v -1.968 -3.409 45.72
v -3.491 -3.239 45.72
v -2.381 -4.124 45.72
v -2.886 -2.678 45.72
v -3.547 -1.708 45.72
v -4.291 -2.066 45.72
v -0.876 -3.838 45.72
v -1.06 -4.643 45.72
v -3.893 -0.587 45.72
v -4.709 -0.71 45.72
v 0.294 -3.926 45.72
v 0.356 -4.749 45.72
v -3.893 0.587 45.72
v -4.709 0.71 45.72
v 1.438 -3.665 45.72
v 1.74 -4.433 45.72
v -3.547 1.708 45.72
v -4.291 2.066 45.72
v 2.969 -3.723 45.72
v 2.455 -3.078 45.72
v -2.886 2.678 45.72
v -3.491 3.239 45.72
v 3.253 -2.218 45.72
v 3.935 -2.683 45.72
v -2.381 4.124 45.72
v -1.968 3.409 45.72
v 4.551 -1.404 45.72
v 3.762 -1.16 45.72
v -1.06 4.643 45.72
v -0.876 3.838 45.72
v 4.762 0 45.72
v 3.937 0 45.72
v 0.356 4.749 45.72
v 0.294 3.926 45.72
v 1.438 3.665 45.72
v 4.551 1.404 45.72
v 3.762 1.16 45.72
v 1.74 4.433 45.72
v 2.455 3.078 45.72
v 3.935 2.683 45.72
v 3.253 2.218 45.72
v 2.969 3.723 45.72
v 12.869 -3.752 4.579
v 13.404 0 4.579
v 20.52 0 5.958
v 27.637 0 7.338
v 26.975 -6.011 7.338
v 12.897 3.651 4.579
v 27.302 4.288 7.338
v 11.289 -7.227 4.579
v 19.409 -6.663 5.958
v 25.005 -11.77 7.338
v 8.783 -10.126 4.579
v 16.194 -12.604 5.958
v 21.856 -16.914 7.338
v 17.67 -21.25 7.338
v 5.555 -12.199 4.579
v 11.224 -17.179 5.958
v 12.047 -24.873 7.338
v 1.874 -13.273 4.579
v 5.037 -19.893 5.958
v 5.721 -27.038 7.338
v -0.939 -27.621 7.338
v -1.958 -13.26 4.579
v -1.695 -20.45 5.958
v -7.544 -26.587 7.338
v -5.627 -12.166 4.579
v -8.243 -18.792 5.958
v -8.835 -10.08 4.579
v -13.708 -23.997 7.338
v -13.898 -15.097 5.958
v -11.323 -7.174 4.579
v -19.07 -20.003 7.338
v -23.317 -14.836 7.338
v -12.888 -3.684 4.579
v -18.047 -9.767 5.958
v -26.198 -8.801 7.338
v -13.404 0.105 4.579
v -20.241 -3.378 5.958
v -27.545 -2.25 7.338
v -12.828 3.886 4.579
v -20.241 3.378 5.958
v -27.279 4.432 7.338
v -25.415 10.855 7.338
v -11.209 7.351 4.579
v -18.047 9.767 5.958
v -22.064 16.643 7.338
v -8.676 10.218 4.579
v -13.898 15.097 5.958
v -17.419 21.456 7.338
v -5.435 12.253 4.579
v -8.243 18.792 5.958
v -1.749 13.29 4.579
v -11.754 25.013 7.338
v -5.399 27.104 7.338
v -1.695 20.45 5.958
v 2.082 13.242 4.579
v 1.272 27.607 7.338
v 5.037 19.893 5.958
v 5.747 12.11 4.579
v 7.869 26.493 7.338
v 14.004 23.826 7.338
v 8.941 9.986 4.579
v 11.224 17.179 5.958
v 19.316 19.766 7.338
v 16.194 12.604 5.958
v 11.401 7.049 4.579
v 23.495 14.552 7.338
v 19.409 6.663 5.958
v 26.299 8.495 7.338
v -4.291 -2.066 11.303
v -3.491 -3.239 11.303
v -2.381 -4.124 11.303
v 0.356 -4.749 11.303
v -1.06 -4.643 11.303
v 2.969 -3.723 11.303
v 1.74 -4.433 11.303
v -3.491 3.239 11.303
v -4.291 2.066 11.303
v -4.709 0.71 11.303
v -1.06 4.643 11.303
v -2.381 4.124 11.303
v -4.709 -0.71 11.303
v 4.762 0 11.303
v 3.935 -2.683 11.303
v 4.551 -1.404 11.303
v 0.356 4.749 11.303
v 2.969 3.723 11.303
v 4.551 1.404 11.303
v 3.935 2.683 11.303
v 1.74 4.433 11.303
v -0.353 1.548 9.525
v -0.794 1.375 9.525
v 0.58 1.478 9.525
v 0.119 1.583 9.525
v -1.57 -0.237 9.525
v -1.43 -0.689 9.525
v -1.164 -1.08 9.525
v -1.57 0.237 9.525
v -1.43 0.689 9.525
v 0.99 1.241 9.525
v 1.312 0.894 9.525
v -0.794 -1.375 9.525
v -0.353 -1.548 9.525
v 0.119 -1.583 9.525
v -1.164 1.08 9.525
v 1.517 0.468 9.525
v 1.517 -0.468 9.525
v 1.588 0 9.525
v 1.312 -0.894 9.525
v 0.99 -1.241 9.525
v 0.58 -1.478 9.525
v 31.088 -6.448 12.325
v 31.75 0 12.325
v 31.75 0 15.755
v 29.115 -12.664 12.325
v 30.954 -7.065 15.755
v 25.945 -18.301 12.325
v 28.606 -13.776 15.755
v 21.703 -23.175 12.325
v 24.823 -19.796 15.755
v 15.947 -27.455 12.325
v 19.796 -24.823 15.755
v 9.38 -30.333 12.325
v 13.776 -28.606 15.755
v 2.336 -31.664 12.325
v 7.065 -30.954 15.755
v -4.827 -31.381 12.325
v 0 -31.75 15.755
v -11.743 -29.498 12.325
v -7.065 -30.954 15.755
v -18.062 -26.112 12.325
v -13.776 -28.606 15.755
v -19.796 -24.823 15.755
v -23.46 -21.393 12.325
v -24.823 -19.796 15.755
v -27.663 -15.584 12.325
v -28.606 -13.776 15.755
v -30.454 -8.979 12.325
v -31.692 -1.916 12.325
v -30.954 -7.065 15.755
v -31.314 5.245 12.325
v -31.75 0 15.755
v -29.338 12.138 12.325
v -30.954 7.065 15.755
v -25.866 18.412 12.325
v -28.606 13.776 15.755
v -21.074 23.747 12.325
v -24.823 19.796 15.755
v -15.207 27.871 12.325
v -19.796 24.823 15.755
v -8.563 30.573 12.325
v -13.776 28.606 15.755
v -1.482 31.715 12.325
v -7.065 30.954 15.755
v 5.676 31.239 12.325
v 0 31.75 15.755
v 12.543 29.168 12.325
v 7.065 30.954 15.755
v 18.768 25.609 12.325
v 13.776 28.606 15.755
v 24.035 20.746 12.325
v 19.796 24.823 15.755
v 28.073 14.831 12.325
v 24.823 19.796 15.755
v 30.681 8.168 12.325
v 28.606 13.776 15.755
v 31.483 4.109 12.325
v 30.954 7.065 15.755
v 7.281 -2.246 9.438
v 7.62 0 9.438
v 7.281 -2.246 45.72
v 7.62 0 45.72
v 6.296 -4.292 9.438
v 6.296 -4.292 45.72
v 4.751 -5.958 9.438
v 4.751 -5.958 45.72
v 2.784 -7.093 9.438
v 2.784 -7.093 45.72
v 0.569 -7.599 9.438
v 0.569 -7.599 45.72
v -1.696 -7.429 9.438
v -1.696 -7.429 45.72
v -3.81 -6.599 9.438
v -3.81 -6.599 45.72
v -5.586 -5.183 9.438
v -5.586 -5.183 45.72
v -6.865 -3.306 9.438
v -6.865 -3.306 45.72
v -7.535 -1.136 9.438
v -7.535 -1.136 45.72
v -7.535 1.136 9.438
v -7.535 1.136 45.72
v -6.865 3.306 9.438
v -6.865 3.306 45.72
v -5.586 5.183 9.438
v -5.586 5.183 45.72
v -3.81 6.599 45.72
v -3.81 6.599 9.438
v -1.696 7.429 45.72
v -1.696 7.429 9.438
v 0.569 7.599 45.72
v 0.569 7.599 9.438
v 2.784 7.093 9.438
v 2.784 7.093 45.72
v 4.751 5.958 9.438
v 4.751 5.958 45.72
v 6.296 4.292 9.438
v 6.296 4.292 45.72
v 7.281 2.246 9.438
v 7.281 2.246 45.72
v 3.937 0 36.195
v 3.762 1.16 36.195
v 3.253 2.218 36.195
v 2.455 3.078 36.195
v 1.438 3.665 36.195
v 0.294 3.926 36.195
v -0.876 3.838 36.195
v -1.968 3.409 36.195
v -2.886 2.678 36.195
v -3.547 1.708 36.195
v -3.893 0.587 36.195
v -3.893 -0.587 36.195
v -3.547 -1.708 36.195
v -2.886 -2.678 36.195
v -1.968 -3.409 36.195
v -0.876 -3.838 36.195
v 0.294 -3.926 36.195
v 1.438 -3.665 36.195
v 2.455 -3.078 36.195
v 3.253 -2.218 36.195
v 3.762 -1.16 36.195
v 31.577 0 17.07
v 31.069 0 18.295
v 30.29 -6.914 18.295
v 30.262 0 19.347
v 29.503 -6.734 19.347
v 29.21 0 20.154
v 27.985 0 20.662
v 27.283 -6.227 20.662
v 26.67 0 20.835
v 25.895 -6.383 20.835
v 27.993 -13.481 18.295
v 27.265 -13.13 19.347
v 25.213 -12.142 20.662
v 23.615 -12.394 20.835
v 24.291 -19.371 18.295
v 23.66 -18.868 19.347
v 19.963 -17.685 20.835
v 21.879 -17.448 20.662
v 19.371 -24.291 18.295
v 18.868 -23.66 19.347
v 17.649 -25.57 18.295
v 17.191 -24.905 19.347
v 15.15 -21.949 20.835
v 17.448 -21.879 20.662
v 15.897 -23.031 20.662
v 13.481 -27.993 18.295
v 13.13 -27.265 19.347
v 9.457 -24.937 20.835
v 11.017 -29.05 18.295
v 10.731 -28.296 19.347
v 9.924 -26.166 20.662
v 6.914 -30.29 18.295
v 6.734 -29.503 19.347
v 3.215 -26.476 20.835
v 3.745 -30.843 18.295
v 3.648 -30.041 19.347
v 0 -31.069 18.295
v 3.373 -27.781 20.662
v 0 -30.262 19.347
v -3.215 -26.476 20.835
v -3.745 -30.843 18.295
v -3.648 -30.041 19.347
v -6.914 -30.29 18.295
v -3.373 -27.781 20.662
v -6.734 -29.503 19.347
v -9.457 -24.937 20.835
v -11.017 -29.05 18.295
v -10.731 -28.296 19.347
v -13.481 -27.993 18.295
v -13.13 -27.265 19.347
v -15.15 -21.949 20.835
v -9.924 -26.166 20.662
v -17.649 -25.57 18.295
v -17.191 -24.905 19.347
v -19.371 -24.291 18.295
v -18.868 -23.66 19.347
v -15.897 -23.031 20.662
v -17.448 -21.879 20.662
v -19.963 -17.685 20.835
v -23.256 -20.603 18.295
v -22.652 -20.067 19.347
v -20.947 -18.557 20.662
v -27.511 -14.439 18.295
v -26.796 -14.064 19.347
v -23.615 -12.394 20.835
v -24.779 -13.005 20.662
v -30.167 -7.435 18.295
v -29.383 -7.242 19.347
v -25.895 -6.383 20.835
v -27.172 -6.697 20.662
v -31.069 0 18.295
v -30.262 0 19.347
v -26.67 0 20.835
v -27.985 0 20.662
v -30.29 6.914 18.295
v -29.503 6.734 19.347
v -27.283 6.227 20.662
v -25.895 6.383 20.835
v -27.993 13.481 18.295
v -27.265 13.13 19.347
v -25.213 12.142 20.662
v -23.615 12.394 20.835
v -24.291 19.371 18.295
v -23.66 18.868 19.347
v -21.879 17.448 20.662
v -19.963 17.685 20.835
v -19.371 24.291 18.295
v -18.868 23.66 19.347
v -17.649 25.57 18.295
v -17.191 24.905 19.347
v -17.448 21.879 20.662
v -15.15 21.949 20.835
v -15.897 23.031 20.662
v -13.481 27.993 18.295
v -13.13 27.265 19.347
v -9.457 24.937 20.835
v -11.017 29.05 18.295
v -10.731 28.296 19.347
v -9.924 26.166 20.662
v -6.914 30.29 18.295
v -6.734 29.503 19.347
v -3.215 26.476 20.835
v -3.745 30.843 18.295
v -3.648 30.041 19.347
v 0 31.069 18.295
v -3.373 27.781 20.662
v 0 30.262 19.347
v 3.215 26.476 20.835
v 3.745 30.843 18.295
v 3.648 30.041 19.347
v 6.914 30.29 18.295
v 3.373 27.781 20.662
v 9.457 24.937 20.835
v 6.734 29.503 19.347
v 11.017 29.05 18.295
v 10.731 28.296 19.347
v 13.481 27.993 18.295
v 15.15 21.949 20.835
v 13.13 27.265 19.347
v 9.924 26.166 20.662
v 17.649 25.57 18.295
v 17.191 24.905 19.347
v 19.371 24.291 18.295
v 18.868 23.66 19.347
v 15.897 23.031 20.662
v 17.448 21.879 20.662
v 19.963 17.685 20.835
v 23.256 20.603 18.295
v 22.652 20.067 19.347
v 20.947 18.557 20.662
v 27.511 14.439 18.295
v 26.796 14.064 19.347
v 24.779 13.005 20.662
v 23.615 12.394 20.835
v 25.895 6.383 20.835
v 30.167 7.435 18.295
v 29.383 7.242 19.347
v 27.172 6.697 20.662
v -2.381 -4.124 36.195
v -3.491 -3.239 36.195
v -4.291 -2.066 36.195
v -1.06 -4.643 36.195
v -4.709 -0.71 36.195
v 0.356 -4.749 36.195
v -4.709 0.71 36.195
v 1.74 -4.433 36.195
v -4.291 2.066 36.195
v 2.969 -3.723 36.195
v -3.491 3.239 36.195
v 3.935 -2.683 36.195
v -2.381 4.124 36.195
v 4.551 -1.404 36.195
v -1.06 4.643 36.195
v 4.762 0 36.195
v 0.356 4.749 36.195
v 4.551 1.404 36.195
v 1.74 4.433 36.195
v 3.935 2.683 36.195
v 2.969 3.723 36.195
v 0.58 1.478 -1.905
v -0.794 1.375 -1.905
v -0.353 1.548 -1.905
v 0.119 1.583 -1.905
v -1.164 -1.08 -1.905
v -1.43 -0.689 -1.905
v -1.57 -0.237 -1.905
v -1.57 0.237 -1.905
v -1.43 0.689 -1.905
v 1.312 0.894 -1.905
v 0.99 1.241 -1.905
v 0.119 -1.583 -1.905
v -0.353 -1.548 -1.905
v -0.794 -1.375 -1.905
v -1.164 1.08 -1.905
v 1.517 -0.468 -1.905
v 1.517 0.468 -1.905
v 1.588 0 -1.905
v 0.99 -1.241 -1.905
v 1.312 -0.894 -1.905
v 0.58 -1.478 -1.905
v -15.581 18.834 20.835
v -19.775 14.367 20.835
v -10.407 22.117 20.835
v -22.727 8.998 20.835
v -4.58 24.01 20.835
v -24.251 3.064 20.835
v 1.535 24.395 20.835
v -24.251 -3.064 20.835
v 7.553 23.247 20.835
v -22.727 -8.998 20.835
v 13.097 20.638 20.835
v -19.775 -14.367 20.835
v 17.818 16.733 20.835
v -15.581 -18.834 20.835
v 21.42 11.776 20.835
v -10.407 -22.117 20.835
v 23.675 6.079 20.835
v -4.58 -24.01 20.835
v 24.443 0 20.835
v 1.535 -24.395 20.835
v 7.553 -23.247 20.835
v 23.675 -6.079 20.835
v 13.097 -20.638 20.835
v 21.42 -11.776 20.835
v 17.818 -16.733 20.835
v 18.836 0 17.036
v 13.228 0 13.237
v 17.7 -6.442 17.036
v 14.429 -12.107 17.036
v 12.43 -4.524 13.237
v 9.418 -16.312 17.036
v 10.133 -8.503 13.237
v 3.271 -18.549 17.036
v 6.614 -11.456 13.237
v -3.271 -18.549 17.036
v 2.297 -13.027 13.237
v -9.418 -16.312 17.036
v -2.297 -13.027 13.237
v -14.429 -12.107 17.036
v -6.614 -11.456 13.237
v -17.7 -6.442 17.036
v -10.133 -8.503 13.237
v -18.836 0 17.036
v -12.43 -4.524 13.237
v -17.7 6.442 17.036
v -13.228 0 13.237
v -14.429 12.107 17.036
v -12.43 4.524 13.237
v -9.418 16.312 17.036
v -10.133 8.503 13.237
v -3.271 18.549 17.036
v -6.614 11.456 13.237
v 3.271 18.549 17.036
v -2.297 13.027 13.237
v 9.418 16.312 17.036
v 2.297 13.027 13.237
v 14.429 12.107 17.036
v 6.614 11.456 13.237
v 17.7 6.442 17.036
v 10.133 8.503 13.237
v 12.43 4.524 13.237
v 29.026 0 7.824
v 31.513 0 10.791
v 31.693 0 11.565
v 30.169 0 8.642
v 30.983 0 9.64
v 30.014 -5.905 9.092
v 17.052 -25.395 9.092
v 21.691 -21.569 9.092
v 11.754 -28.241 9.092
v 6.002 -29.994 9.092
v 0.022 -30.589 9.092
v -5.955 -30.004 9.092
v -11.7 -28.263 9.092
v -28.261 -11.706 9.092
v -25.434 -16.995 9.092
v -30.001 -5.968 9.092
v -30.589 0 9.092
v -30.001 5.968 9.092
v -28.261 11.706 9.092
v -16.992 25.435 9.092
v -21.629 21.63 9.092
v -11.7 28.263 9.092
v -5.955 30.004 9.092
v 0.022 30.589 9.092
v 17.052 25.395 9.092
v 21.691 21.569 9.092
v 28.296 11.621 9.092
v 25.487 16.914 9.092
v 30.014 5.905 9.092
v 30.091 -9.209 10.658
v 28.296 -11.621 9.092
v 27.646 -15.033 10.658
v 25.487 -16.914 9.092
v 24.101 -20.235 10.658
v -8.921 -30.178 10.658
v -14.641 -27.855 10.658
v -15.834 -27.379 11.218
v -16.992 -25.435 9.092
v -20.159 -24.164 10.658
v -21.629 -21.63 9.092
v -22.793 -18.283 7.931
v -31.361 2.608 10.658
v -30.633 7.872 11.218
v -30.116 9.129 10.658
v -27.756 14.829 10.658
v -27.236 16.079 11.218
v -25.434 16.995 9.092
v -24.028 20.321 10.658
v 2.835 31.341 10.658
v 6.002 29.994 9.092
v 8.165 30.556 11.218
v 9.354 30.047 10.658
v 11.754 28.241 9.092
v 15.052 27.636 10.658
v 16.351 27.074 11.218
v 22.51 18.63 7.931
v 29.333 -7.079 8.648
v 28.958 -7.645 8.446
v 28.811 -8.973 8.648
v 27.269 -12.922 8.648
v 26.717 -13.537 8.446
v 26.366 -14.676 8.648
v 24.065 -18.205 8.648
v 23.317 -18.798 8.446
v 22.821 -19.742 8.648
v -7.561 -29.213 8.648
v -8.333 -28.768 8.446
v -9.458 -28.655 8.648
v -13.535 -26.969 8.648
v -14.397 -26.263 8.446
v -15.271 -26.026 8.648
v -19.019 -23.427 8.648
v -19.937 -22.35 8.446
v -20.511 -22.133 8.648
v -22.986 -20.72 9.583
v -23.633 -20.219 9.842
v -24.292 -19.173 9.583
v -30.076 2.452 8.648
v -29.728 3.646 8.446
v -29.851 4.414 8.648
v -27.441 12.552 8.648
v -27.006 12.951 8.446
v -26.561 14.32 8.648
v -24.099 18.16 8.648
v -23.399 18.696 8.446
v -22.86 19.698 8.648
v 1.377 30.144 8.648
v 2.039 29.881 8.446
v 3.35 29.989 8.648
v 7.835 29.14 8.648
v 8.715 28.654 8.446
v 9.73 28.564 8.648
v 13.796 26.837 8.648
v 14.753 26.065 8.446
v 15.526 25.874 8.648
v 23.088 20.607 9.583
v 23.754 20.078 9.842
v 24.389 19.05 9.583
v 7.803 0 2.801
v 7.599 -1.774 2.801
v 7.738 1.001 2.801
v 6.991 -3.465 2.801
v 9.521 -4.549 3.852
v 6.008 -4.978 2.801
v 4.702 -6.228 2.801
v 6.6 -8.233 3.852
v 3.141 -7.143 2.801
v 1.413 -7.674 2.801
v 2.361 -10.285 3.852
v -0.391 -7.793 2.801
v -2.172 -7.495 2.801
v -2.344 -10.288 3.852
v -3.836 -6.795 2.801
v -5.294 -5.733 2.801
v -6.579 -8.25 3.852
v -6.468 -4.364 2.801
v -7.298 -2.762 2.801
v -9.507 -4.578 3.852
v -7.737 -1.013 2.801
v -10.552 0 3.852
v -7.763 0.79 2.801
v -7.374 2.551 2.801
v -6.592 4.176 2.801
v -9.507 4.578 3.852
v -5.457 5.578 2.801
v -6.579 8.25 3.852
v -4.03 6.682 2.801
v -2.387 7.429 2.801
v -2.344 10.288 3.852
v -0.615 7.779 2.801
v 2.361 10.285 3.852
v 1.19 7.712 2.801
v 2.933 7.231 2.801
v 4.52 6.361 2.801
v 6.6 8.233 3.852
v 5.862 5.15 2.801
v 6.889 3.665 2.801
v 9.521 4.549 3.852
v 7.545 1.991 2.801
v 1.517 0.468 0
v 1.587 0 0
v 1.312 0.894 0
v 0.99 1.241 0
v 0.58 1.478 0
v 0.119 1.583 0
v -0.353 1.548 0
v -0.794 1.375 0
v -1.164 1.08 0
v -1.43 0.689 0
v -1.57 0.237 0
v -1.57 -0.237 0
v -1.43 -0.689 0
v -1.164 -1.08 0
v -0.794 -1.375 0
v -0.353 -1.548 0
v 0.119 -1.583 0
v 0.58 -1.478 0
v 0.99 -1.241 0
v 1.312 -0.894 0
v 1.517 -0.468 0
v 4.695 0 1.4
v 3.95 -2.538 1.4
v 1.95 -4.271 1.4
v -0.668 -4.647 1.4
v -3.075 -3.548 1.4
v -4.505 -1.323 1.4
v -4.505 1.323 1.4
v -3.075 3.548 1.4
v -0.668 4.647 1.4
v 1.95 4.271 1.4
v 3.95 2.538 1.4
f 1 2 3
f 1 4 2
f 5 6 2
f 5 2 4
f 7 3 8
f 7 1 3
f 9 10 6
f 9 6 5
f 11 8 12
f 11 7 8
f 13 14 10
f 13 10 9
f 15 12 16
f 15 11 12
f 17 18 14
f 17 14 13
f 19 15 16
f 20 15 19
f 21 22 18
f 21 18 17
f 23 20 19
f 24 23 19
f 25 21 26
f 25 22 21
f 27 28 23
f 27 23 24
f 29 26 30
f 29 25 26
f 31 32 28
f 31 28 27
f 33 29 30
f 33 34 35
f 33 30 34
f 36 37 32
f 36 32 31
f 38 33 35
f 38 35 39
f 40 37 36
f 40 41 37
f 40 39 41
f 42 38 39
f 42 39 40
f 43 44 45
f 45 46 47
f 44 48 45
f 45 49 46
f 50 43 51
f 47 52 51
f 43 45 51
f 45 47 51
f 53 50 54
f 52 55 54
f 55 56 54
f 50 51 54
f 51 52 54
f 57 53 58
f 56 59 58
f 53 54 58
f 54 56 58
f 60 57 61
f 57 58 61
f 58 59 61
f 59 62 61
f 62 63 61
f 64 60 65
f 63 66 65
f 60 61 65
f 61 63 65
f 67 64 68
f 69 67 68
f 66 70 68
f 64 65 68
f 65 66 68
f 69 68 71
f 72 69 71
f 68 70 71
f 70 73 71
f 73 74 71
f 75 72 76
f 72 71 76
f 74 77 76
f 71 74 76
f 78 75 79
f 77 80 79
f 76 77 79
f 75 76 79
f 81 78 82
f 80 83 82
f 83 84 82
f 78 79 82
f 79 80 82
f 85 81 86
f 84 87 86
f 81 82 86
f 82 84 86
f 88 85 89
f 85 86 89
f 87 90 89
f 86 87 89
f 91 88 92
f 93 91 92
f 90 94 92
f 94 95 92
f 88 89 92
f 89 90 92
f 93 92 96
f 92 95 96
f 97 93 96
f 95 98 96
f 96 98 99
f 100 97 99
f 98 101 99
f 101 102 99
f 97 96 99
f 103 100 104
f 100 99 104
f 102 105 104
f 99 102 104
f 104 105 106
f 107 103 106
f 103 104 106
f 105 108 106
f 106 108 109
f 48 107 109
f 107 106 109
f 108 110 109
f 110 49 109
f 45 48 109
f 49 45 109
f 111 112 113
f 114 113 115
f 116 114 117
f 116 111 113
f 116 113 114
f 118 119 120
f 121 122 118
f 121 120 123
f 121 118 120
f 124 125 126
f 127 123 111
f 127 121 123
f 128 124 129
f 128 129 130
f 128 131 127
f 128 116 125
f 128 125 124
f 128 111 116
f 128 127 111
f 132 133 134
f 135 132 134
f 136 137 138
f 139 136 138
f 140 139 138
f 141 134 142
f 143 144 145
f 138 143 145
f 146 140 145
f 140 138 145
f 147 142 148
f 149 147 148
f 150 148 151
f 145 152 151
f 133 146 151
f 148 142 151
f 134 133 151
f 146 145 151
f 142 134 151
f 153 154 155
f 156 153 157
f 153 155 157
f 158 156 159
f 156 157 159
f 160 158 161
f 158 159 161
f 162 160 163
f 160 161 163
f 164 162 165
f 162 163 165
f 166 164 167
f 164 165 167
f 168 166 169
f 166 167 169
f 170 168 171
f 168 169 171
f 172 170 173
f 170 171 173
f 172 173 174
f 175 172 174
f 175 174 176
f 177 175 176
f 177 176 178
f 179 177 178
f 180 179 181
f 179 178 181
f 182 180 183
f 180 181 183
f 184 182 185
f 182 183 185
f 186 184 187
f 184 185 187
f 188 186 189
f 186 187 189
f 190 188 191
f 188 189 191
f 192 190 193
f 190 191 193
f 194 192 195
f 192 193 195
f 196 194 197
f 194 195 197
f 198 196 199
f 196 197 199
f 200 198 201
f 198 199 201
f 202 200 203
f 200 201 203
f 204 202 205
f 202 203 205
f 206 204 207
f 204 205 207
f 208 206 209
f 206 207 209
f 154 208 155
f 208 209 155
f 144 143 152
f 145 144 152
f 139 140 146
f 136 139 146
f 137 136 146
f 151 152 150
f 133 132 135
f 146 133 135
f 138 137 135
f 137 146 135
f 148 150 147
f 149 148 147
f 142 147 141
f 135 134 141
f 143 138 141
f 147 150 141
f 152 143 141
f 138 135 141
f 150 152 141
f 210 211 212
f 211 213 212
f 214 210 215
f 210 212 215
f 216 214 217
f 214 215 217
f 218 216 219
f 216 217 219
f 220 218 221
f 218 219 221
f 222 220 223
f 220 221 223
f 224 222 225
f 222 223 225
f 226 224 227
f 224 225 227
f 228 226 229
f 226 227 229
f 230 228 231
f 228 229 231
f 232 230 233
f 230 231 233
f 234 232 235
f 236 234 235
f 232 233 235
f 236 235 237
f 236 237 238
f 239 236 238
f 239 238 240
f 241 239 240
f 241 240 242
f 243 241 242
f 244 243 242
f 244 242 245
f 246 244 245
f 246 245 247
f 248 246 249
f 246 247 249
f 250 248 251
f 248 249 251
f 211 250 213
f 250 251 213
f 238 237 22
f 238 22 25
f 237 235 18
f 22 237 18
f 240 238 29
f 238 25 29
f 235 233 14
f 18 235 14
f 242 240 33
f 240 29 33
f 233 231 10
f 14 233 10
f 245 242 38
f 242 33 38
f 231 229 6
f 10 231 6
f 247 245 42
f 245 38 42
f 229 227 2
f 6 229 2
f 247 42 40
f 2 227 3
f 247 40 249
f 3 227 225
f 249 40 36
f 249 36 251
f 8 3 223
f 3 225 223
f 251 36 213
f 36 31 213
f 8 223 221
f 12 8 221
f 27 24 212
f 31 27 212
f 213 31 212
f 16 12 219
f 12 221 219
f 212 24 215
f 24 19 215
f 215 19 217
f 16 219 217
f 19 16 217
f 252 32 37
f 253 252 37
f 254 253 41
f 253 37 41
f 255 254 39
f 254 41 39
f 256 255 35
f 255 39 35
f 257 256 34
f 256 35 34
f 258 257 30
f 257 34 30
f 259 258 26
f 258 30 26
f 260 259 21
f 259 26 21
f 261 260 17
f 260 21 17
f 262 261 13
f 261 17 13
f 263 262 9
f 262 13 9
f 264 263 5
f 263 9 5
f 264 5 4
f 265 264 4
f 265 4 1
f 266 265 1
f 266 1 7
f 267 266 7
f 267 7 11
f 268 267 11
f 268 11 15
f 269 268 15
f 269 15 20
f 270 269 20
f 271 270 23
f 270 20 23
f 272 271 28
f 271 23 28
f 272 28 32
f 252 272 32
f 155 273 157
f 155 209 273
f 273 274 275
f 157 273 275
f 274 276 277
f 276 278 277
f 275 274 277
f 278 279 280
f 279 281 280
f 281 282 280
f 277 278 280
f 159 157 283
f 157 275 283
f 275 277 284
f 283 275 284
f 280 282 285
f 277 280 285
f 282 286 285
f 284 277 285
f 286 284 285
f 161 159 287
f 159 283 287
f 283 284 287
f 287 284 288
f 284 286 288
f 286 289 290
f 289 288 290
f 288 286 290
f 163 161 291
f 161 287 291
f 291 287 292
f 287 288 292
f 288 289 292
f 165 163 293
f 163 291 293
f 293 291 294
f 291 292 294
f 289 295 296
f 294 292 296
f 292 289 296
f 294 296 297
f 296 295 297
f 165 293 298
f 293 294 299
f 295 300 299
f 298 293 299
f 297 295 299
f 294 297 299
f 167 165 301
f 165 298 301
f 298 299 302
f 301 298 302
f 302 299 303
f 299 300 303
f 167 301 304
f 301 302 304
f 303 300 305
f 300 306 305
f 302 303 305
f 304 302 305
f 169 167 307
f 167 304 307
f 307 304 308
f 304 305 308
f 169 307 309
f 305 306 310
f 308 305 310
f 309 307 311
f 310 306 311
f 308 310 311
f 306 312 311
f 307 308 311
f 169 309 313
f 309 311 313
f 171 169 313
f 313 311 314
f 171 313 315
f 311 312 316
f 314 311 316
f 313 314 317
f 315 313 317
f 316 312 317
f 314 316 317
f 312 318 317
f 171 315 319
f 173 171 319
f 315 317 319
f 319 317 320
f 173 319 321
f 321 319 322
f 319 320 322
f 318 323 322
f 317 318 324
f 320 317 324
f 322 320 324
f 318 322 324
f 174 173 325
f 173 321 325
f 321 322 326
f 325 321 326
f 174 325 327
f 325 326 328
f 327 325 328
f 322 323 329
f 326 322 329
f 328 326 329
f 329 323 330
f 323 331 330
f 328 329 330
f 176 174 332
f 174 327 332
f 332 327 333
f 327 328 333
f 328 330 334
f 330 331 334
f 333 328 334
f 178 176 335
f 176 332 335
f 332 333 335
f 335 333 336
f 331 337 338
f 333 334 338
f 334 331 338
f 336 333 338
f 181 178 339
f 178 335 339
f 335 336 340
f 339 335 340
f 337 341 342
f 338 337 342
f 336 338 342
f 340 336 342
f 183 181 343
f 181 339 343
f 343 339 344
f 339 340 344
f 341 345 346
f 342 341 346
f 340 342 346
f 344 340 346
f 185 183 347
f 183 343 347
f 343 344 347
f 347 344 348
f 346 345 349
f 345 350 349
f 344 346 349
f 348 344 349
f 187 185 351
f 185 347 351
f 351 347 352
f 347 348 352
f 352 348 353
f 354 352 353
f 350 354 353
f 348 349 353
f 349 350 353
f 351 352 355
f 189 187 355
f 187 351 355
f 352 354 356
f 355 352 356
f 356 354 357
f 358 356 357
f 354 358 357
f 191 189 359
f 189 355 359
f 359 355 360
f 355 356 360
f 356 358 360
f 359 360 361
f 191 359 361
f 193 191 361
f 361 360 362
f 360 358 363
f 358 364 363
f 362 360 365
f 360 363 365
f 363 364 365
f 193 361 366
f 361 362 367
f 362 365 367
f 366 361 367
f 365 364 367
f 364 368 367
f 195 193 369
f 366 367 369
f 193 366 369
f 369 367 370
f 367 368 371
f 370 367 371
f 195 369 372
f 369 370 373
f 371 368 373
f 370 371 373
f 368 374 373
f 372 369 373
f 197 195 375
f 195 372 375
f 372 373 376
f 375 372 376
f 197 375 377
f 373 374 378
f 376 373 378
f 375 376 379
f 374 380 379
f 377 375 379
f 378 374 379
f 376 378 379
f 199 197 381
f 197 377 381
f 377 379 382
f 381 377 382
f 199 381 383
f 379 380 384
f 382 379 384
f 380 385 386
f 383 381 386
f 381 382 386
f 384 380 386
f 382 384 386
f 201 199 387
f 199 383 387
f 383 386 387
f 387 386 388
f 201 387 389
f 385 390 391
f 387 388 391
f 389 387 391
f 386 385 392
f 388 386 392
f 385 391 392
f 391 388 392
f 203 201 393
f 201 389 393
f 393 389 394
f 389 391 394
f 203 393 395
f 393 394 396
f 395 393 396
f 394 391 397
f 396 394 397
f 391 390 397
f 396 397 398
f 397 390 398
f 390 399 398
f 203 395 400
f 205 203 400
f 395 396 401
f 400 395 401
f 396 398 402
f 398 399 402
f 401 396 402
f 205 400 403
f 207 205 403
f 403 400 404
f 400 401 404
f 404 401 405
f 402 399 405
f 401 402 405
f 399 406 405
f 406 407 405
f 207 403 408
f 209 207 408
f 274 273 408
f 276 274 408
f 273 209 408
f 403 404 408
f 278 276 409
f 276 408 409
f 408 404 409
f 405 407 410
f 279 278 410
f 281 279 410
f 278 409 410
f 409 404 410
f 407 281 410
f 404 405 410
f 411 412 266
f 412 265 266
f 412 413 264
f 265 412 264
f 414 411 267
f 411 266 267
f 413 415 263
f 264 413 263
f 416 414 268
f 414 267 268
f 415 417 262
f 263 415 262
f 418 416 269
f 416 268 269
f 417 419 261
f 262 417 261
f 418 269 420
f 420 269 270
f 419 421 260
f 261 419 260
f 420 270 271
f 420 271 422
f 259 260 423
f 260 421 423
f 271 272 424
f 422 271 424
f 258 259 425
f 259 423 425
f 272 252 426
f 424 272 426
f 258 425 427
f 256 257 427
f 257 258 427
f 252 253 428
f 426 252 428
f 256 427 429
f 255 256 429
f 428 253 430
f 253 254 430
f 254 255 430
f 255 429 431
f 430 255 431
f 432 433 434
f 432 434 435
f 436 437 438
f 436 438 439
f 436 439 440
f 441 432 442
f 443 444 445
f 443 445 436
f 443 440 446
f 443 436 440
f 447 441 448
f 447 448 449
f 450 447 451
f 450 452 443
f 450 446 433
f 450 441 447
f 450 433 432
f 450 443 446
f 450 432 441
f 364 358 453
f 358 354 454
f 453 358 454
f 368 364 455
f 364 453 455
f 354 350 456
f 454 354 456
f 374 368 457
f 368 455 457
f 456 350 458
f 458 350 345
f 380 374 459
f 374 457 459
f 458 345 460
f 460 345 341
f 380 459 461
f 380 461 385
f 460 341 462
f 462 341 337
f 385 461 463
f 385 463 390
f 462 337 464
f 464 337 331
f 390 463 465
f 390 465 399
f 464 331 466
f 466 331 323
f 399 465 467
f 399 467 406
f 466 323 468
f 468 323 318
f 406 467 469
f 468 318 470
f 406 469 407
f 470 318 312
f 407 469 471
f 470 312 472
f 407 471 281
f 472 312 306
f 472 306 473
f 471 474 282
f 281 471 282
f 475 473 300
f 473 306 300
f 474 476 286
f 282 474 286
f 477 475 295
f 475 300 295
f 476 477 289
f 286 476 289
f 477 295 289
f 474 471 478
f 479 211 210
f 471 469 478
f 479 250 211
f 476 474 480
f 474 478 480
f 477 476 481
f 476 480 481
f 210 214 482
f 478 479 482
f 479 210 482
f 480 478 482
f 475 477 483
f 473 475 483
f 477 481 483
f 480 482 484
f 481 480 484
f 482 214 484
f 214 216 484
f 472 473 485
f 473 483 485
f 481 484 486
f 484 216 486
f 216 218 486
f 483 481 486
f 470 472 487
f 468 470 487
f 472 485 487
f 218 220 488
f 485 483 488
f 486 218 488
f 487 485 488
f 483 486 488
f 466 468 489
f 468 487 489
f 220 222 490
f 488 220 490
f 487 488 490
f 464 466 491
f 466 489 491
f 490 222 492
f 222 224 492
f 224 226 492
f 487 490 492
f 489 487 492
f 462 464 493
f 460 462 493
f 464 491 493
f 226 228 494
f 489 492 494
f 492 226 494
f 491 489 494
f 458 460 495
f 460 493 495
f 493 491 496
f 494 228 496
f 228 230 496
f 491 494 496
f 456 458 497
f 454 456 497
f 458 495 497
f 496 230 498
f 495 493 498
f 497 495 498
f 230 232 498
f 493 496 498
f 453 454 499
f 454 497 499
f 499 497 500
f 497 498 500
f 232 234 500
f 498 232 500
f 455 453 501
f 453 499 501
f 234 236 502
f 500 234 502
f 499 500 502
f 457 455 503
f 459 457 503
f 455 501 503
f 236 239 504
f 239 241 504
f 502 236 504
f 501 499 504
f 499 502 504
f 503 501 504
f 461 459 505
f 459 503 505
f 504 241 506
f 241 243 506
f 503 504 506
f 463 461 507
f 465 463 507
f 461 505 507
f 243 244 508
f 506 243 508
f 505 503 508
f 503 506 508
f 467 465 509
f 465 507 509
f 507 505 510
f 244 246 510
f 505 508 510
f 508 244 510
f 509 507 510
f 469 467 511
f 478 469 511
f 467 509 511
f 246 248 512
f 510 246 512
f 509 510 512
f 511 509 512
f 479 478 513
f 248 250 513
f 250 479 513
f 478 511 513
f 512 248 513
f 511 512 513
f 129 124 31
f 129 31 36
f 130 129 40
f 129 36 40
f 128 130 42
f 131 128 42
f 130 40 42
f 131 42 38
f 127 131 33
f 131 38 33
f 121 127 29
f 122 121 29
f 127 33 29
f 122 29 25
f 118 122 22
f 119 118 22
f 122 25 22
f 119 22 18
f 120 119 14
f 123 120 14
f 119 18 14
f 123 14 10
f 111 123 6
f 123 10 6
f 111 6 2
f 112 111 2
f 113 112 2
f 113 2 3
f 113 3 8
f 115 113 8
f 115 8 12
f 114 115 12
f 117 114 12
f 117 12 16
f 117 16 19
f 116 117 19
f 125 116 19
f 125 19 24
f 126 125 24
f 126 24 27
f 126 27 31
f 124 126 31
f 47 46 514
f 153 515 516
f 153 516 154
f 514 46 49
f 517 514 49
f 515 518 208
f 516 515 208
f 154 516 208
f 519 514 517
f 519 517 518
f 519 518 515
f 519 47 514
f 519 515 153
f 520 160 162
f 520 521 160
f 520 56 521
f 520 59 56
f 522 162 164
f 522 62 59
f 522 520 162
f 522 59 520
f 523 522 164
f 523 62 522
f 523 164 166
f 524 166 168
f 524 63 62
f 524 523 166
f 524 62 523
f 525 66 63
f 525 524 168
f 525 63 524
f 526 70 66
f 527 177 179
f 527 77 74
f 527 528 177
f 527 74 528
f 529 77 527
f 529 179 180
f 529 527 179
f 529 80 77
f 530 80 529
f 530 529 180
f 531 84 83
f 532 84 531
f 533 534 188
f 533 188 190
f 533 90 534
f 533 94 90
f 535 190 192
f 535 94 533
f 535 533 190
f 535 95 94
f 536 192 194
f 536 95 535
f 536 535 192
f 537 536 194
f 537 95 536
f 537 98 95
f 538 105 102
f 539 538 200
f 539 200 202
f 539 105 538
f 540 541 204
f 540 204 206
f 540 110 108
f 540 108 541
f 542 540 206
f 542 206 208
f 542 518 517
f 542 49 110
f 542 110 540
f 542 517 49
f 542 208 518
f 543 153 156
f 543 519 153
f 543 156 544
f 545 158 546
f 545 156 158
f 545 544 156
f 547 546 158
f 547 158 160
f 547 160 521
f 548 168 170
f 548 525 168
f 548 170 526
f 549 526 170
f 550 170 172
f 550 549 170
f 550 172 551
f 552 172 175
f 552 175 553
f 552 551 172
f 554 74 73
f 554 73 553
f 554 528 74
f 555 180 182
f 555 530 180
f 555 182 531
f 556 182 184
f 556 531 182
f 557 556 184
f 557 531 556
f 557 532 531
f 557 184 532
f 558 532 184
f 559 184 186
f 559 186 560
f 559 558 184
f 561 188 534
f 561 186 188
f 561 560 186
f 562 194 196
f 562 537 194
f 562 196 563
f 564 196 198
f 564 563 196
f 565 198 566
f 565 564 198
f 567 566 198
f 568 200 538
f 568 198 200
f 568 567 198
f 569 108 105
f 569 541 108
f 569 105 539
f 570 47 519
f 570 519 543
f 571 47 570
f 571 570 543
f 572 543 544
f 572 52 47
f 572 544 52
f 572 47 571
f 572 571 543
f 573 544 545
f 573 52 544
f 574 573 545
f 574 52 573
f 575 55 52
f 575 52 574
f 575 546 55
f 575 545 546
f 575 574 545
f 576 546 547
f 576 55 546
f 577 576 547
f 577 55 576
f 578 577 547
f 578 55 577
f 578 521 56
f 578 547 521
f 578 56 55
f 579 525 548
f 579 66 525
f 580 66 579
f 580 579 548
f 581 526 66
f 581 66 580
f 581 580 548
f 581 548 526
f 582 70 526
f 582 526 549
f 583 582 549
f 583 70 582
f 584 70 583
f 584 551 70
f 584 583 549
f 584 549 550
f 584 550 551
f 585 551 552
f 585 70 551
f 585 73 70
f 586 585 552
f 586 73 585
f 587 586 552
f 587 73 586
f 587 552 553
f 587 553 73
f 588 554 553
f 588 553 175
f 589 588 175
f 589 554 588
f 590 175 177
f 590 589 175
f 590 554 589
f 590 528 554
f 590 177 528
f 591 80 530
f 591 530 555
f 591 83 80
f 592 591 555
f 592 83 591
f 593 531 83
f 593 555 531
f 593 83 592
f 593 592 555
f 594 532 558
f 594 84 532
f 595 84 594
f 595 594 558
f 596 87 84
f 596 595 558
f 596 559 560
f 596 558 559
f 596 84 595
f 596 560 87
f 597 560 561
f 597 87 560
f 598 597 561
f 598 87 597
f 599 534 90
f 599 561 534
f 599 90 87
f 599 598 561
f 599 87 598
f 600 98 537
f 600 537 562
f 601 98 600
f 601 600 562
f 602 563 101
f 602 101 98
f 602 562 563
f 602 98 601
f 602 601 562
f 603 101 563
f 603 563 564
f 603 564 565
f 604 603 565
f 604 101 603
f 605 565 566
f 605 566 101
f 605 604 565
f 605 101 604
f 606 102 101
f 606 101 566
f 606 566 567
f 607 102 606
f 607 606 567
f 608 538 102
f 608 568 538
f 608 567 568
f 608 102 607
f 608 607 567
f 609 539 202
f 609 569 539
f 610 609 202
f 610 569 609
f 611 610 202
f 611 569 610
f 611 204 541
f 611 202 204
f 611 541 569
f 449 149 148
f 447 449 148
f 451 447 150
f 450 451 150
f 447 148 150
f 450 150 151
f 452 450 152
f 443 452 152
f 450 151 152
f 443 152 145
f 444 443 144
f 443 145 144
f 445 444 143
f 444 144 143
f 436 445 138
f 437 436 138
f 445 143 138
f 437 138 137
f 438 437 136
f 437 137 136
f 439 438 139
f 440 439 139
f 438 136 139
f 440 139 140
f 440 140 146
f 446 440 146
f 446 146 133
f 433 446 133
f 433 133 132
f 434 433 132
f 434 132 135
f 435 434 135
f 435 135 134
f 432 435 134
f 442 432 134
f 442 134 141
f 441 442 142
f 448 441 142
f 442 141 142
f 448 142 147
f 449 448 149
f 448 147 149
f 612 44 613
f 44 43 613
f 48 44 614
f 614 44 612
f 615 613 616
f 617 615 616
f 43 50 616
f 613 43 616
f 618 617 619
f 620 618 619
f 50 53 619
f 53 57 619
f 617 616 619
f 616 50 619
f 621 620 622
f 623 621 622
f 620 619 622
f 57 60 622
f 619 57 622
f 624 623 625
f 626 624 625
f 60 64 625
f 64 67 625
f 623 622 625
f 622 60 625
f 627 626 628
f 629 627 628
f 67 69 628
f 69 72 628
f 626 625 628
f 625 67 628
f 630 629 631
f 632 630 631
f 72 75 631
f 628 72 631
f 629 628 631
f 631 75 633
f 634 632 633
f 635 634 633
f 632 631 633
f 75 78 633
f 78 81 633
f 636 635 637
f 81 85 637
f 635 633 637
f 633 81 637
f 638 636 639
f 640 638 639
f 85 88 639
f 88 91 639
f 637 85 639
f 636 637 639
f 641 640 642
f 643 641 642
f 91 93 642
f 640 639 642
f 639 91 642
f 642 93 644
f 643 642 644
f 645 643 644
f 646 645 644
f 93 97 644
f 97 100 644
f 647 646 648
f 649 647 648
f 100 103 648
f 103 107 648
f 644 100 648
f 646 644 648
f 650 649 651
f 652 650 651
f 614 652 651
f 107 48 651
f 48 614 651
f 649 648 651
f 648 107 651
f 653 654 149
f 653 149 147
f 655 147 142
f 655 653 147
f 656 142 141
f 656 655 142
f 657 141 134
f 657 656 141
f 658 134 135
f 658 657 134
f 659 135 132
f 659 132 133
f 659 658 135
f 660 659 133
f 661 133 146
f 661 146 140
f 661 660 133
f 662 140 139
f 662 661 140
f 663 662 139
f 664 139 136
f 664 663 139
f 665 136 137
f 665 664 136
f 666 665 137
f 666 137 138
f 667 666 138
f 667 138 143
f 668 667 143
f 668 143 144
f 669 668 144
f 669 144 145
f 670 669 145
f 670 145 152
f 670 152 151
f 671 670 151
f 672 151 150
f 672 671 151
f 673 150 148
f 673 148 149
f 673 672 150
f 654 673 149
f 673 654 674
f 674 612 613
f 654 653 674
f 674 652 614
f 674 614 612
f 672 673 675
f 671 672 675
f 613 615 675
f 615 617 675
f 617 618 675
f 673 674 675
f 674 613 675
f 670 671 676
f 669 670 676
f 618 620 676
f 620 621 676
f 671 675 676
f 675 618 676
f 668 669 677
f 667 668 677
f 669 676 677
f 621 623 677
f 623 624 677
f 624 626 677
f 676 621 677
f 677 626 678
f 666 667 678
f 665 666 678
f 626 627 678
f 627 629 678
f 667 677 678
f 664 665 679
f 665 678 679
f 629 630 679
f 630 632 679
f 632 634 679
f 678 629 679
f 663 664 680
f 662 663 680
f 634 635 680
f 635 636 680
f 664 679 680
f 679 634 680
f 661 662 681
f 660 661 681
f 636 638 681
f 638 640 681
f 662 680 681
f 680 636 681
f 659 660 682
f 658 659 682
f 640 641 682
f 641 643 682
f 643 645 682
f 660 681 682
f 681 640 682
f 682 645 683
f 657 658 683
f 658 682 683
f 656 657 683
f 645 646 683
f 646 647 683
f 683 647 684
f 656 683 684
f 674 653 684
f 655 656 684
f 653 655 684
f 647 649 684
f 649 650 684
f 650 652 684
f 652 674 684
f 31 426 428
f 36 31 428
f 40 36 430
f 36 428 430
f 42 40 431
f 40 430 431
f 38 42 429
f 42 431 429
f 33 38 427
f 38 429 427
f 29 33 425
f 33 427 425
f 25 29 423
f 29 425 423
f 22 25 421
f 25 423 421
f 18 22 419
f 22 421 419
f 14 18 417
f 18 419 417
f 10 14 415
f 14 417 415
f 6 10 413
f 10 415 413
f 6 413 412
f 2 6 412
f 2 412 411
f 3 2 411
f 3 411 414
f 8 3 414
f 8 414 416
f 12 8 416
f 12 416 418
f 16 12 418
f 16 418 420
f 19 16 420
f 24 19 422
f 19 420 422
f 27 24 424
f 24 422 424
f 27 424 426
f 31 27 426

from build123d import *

# Parameters (mm, degrees)
F2_R      = 5.08
F3_R      = 25.4
F4_R      = 4.7625
F5_DEPTH  = 9.525
F6_R      = 1.5875
F7_DEPTH  = 9.525
F5_FACE_R = 4.7625
F8_DEPTH  = 9.525
F9_DEPTH  = 24.892
F10_R     = 3.936794
F11_DEPTH = 9.525
F7_FACE_R = 1.5875
F12_DEPTH = 11.43


with BuildPart() as f1:
    # F0 (on Front) → F1 (revolve)
    with BuildSketch(Plane.XZ):
        Polygon((10.500061, 4.015946), (31.75, 8.134865), (31.75, 20.834865), (24.443309, 20.834865), (7.62, 9.438433), (7.62, 45.72), (0, 45.72), (0, 0), (1.5875, 0), align=None)
    revolve(axis=Axis((0, 0, 22.86), (0, 0, -1)))

    # F2
    f2_edges = [f1.edges().sort_by_distance(p)[0] for p in [
        (-31.75, 0, 8.134865),
        (-31.75, 0, 20.834865),
        (31.75, 0, 14.484865),
    ]]
    fillet(f2_edges, radius=F2_R)

    # F3
    f3_edges = [f1.edges().sort_by_distance(p)[0] for p in [
        (-10.500061, 0, 4.015946),
    ]]
    fillet(f3_edges, radius=F3_R)

    # F4 (on face) → F5 (cut)
    with BuildSketch(Plane.XY.offset(45.72)):
        Circle(F4_R)
    extrude(amount=-F5_DEPTH, mode=Mode.SUBTRACT)

    # F6 (on Top) → F7 (cut)
    with BuildSketch(Plane.XY):
        Circle(F6_R)
    extrude(amount=F7_DEPTH, mode=Mode.SUBTRACT)

    # F5_face (on face) → F9 (cut)
    with BuildSketch(Plane.XY.offset(36.195)):
        Circle(F5_FACE_R)
    extrude(amount=-F9_DEPTH, mode=Mode.SUBTRACT)


with BuildPart() as f8:
    # F5_face (on face) → F8 (new body)
    with BuildSketch(Plane.XY.offset(36.195)):
        Circle(F5_FACE_R)
    extrude(amount=F8_DEPTH)

    # F10 (on face) → F11 (cut)
    with BuildSketch(Plane.XY.offset(45.72)):
        Circle(F10_R)
    extrude(amount=-F11_DEPTH, mode=Mode.SUBTRACT)


with BuildPart() as f12:
    # F7_face (on face) → F12 (new body)
    with BuildSketch(Plane(origin=(0, 0, 9.525), x_dir=(1, 0, 0), z_dir=(0, 0, -1))):
        Circle(F7_FACE_R)
    extrude(amount=F12_DEPTH)


solid = Compound([f1.part, f8.part, f12.part])
